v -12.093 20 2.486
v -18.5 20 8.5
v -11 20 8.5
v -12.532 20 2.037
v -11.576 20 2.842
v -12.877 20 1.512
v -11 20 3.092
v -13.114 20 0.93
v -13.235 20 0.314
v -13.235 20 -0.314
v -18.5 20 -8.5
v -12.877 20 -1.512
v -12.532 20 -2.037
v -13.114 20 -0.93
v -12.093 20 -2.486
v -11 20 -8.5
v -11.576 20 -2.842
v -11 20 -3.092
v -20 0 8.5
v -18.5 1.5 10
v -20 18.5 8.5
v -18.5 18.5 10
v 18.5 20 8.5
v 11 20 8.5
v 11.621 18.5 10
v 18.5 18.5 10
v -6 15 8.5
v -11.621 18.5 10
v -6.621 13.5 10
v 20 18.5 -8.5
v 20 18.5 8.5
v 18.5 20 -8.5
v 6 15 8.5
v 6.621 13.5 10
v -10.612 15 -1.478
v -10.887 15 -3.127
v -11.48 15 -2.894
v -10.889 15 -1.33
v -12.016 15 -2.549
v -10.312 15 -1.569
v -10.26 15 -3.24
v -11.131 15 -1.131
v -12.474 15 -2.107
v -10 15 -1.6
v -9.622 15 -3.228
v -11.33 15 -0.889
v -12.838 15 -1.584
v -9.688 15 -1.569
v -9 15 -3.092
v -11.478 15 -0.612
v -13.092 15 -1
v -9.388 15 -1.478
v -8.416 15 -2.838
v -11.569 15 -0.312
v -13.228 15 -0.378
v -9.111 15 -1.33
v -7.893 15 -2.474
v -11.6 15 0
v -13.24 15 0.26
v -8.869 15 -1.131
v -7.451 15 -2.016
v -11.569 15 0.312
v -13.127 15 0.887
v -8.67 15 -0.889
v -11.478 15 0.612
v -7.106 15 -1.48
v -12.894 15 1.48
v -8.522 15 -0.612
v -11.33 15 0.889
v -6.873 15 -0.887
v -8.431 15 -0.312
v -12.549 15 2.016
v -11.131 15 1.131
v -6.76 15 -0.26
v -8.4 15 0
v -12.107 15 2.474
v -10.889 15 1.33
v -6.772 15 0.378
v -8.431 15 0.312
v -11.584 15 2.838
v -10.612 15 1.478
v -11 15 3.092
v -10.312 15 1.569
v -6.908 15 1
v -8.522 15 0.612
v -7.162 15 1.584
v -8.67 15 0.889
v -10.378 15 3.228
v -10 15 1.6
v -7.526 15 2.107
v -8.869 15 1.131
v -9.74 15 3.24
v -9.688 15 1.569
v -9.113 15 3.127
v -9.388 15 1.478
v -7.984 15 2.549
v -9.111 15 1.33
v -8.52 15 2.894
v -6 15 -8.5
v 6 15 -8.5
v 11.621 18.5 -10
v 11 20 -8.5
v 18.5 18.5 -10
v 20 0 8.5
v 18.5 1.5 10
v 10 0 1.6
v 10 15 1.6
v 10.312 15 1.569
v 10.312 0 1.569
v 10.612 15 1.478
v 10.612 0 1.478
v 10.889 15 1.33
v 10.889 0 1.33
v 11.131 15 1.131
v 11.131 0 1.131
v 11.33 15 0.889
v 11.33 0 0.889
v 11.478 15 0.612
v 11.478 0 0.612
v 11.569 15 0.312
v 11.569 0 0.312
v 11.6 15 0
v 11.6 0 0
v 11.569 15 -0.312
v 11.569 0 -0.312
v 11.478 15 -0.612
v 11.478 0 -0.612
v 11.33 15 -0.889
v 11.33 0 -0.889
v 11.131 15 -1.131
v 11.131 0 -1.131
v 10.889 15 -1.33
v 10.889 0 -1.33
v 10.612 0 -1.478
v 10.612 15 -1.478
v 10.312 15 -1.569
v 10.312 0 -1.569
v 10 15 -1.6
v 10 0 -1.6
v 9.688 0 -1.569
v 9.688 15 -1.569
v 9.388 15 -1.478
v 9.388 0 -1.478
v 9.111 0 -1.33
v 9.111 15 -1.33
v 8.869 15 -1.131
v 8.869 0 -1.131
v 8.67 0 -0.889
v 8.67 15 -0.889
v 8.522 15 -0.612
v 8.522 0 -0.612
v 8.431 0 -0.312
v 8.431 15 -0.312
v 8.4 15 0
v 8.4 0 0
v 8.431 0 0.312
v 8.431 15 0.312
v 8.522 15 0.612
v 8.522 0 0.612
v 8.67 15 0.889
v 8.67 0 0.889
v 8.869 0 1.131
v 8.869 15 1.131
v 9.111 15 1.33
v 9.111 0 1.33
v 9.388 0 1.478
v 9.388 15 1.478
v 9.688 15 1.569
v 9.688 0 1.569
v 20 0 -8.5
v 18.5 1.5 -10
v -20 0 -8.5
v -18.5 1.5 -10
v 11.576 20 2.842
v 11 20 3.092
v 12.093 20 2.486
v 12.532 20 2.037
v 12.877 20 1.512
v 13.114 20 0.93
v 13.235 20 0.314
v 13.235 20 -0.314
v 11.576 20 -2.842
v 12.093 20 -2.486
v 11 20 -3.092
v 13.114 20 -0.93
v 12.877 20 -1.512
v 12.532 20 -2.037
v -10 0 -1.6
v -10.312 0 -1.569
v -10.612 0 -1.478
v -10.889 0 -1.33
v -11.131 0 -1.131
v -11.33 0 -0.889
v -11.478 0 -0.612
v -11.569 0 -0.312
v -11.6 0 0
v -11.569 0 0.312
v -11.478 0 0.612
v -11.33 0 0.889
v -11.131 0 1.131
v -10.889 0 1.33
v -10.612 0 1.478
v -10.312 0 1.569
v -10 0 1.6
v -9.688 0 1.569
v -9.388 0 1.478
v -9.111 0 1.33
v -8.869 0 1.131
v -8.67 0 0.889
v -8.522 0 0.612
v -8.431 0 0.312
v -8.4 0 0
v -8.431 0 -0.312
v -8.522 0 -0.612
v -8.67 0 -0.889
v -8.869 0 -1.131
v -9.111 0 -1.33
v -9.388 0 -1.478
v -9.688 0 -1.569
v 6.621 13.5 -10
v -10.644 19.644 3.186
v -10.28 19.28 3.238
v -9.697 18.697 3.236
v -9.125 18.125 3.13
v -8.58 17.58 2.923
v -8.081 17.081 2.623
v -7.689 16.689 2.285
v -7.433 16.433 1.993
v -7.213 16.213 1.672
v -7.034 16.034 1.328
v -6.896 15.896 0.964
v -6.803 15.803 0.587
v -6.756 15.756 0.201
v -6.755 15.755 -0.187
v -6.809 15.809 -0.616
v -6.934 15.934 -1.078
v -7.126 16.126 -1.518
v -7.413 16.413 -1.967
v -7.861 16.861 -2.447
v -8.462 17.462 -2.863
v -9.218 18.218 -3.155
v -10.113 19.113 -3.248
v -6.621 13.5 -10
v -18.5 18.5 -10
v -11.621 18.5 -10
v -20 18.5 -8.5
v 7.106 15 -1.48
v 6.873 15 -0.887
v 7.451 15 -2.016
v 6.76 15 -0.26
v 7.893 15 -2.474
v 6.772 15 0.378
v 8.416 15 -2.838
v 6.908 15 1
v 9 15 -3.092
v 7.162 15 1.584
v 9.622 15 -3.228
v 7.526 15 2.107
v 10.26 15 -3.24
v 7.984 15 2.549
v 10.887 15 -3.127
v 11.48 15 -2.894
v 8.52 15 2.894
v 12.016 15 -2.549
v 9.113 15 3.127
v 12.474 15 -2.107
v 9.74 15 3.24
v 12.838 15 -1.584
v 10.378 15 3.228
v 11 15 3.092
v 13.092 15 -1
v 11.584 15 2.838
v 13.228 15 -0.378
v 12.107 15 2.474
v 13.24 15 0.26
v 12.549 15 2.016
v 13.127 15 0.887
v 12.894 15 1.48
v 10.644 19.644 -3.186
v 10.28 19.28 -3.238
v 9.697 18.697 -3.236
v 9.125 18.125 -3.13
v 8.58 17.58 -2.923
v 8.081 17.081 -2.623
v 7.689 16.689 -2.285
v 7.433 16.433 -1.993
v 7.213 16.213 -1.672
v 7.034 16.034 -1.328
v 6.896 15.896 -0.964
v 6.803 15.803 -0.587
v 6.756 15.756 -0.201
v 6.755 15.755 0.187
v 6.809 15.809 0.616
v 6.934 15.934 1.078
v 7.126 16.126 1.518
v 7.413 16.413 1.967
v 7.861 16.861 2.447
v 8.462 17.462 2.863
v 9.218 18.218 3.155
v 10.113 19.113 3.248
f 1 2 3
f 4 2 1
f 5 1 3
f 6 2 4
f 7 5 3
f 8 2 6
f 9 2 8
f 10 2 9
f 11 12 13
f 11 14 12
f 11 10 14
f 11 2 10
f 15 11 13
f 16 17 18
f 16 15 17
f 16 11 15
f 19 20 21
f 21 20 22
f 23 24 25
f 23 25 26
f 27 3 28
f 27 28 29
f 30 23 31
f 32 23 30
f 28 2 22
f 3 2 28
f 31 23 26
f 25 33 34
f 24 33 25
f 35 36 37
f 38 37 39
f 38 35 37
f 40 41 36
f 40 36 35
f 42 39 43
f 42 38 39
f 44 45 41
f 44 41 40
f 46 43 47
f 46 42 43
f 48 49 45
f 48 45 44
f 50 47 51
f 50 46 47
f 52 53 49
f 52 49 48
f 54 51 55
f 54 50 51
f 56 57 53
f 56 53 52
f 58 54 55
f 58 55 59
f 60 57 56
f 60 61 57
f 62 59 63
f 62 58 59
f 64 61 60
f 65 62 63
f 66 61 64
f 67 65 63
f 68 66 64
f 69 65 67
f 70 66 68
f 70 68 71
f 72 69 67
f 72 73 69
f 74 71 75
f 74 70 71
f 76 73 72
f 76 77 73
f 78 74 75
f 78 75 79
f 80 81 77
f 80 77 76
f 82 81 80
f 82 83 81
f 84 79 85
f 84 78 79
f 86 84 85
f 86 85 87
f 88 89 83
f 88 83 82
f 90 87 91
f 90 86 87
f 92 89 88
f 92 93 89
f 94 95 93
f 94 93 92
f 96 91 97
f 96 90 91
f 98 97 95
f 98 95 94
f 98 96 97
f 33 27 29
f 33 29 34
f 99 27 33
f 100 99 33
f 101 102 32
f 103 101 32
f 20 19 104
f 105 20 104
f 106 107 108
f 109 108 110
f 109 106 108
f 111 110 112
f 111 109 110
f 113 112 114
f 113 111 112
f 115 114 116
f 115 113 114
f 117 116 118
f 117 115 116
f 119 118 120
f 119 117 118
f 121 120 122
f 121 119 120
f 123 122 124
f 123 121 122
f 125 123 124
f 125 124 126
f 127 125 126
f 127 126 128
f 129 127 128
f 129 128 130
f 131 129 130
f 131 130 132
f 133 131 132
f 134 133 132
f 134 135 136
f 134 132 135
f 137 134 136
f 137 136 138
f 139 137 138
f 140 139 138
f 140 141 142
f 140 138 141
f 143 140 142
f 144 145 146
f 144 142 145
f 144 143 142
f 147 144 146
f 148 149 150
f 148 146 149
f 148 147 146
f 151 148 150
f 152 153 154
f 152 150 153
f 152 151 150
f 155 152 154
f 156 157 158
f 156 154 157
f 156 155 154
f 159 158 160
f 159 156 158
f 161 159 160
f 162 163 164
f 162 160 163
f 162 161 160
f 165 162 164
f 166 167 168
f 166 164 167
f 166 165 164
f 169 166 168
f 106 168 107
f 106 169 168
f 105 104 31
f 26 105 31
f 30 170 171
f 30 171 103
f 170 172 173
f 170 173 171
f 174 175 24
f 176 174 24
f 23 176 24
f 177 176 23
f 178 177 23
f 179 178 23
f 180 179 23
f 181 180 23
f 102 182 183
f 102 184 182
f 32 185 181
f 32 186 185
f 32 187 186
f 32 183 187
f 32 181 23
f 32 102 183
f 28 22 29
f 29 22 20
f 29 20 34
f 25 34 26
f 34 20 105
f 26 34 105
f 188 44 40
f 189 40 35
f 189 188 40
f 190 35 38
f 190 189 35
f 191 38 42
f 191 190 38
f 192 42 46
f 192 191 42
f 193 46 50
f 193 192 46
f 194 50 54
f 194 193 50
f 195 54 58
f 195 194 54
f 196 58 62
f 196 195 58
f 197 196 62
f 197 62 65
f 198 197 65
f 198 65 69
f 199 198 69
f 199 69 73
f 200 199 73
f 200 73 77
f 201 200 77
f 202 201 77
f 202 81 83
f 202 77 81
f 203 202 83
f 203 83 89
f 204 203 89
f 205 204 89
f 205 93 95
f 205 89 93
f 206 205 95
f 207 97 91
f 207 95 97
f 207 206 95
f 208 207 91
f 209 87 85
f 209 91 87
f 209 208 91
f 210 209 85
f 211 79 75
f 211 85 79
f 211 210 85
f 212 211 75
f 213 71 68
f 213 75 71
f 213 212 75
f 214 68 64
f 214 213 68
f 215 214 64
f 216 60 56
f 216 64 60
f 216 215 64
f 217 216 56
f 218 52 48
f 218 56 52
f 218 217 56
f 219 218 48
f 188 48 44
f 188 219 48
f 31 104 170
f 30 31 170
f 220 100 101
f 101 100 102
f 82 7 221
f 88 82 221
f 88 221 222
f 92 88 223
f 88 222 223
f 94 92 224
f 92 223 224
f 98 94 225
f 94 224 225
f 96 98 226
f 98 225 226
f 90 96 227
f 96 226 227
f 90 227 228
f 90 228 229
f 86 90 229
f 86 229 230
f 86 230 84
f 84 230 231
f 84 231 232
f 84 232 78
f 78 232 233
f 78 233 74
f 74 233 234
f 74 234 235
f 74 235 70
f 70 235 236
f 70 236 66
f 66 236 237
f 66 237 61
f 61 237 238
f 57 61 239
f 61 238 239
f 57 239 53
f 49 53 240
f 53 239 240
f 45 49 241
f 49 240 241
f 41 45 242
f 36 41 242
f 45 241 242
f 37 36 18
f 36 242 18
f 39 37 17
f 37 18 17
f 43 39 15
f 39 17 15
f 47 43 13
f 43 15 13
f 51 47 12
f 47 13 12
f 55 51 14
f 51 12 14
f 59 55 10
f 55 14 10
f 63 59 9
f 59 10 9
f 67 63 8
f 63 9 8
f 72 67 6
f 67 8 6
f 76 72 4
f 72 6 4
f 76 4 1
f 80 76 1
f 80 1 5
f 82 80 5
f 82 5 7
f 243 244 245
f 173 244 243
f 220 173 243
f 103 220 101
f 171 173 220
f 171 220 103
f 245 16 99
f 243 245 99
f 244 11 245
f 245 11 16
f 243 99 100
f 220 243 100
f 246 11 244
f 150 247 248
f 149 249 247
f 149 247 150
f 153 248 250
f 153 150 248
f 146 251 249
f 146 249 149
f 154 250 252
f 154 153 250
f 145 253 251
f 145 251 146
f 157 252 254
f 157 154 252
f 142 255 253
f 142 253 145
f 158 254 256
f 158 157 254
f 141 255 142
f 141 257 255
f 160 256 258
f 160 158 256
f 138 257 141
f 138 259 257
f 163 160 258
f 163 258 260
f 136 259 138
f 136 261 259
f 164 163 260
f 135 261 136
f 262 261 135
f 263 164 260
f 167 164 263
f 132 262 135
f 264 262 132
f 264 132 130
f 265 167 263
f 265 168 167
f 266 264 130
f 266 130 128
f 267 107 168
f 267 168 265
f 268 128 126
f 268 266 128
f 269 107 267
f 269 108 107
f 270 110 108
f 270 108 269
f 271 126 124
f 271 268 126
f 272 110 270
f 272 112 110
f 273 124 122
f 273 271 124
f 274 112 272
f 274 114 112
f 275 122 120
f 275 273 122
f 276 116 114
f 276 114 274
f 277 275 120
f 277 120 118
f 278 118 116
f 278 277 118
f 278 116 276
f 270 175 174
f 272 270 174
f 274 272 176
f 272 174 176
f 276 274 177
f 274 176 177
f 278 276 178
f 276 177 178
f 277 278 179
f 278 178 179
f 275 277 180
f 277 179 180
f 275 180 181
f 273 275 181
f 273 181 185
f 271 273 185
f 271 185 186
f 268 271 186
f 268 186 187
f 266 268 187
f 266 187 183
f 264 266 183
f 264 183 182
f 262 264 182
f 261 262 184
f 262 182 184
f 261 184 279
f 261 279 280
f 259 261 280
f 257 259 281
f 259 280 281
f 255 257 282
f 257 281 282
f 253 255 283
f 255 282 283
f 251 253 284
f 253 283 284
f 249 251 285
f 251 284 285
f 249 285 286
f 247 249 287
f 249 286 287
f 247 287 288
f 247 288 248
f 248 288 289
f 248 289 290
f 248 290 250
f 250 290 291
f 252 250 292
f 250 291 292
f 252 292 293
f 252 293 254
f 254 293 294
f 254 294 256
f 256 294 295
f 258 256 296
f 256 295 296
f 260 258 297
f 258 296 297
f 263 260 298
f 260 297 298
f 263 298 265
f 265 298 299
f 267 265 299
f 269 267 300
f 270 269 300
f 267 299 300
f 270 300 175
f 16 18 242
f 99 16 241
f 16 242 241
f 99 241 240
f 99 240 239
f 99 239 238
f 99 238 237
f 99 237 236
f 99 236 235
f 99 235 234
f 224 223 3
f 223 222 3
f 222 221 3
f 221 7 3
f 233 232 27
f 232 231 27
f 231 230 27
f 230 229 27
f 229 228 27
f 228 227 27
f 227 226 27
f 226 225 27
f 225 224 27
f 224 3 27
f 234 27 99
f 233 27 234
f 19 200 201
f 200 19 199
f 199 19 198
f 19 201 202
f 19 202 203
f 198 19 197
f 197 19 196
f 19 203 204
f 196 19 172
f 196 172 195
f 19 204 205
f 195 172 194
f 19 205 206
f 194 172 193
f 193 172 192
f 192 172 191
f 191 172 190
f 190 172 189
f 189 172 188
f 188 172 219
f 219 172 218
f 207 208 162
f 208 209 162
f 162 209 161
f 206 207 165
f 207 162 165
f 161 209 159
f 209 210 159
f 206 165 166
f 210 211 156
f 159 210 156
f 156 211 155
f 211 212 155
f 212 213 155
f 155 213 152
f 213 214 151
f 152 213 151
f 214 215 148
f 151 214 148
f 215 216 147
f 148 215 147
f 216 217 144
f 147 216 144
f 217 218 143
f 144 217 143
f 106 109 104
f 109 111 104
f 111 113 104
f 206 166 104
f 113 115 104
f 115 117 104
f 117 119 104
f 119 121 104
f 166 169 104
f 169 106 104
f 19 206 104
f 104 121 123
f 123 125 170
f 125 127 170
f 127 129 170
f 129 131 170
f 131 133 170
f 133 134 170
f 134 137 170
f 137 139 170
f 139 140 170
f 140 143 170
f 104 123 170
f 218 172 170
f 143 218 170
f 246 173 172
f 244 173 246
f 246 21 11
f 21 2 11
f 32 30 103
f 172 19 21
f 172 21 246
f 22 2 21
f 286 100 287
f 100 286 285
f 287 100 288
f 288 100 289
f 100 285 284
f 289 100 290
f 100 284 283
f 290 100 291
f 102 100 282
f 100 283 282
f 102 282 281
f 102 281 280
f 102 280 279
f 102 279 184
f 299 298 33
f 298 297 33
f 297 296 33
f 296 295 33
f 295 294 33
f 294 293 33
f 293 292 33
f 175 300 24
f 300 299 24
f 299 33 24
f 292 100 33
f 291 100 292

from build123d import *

# Parameters (mm, degrees)
SKETCH_1_W          = 40
SKETCH_1_H          = 20
SKETCH_1_R          = 1.6
EXTRUDE_1_DEPTH     = 20
CUT_EXTRUDE_1_DEPTH = 20
SKETCH_3_R          = 3.25
CUT_EXTRUDE_2_DEPTH = 5
CHAMFER_1_SIZE      = 1.5


with BuildPart() as part:
    # 草图1 → 凸台-拉伸1 (new body)
    with BuildSketch(Plane(origin=(0, 0, 0), x_dir=(1, 0, 0), z_dir=(0, 1, 0))):
        Rectangle(SKETCH_1_W, SKETCH_1_H)
        with Locations(Location((10, 0, 0), (0, 0, 270))):
            Circle(SKETCH_1_R, mode=Mode.SUBTRACT)
        with Locations(Location((-10, 0, 0), (0, 0, 90))):
            Circle(SKETCH_1_R, mode=Mode.SUBTRACT)
    extrude(amount=EXTRUDE_1_DEPTH)

    # 草图2 → 切除-拉伸1 (cut)
    with BuildSketch(Plane.XY.offset(10)):
        Polygon((-6, 15), (6, 15), (11, 20), (-11, 20), align=None)
    extrude(amount=-CUT_EXTRUDE_1_DEPTH, mode=Mode.SUBTRACT)

    # 草图3 → 切除-拉伸2 (cut)
    with BuildSketch(Plane(origin=(0, 20, 0), x_dir=(1, 0, 0), z_dir=(0, 1, 0))):
        with Locations(Location((10, 0, 0), (0, 0, 287.920213139))):
            Circle(SKETCH_3_R)
        with Locations(Location((-10, 0, 0), (0, 0, 252.079786861))):
            Circle(SKETCH_3_R)
    extrude(amount=-CUT_EXTRUDE_2_DEPTH, mode=Mode.SUBTRACT)

    # 倒角1
    chamfer_1_edges = [part.edges().sort_by_distance(p)[0] for p in [
        (-20, 20, 0),
        (-15.5, 20, 10),
        (15.5, 20, 10),
        (-15.5, 20, -10),
        (-8.5, 17.5, -10),
        (8.5, 17.5, -10),
        (0, 15, -10),
        (-8.5, 17.5, 10),
        (0, 15, 10),
        (8.5, 17.5, 10),
        (20, 20, 0),
        (0, 0, 10),
        (0, 0, -10),
        (20, 10, 10),
        (-20, 10, 10),
        (-20, 10, -10),
        (20, 10, -10),
        (15.5, 20, -10),
    ]]
    chamfer(chamfer_1_edges, length=CHAMFER_1_SIZE)


solid = part.part
